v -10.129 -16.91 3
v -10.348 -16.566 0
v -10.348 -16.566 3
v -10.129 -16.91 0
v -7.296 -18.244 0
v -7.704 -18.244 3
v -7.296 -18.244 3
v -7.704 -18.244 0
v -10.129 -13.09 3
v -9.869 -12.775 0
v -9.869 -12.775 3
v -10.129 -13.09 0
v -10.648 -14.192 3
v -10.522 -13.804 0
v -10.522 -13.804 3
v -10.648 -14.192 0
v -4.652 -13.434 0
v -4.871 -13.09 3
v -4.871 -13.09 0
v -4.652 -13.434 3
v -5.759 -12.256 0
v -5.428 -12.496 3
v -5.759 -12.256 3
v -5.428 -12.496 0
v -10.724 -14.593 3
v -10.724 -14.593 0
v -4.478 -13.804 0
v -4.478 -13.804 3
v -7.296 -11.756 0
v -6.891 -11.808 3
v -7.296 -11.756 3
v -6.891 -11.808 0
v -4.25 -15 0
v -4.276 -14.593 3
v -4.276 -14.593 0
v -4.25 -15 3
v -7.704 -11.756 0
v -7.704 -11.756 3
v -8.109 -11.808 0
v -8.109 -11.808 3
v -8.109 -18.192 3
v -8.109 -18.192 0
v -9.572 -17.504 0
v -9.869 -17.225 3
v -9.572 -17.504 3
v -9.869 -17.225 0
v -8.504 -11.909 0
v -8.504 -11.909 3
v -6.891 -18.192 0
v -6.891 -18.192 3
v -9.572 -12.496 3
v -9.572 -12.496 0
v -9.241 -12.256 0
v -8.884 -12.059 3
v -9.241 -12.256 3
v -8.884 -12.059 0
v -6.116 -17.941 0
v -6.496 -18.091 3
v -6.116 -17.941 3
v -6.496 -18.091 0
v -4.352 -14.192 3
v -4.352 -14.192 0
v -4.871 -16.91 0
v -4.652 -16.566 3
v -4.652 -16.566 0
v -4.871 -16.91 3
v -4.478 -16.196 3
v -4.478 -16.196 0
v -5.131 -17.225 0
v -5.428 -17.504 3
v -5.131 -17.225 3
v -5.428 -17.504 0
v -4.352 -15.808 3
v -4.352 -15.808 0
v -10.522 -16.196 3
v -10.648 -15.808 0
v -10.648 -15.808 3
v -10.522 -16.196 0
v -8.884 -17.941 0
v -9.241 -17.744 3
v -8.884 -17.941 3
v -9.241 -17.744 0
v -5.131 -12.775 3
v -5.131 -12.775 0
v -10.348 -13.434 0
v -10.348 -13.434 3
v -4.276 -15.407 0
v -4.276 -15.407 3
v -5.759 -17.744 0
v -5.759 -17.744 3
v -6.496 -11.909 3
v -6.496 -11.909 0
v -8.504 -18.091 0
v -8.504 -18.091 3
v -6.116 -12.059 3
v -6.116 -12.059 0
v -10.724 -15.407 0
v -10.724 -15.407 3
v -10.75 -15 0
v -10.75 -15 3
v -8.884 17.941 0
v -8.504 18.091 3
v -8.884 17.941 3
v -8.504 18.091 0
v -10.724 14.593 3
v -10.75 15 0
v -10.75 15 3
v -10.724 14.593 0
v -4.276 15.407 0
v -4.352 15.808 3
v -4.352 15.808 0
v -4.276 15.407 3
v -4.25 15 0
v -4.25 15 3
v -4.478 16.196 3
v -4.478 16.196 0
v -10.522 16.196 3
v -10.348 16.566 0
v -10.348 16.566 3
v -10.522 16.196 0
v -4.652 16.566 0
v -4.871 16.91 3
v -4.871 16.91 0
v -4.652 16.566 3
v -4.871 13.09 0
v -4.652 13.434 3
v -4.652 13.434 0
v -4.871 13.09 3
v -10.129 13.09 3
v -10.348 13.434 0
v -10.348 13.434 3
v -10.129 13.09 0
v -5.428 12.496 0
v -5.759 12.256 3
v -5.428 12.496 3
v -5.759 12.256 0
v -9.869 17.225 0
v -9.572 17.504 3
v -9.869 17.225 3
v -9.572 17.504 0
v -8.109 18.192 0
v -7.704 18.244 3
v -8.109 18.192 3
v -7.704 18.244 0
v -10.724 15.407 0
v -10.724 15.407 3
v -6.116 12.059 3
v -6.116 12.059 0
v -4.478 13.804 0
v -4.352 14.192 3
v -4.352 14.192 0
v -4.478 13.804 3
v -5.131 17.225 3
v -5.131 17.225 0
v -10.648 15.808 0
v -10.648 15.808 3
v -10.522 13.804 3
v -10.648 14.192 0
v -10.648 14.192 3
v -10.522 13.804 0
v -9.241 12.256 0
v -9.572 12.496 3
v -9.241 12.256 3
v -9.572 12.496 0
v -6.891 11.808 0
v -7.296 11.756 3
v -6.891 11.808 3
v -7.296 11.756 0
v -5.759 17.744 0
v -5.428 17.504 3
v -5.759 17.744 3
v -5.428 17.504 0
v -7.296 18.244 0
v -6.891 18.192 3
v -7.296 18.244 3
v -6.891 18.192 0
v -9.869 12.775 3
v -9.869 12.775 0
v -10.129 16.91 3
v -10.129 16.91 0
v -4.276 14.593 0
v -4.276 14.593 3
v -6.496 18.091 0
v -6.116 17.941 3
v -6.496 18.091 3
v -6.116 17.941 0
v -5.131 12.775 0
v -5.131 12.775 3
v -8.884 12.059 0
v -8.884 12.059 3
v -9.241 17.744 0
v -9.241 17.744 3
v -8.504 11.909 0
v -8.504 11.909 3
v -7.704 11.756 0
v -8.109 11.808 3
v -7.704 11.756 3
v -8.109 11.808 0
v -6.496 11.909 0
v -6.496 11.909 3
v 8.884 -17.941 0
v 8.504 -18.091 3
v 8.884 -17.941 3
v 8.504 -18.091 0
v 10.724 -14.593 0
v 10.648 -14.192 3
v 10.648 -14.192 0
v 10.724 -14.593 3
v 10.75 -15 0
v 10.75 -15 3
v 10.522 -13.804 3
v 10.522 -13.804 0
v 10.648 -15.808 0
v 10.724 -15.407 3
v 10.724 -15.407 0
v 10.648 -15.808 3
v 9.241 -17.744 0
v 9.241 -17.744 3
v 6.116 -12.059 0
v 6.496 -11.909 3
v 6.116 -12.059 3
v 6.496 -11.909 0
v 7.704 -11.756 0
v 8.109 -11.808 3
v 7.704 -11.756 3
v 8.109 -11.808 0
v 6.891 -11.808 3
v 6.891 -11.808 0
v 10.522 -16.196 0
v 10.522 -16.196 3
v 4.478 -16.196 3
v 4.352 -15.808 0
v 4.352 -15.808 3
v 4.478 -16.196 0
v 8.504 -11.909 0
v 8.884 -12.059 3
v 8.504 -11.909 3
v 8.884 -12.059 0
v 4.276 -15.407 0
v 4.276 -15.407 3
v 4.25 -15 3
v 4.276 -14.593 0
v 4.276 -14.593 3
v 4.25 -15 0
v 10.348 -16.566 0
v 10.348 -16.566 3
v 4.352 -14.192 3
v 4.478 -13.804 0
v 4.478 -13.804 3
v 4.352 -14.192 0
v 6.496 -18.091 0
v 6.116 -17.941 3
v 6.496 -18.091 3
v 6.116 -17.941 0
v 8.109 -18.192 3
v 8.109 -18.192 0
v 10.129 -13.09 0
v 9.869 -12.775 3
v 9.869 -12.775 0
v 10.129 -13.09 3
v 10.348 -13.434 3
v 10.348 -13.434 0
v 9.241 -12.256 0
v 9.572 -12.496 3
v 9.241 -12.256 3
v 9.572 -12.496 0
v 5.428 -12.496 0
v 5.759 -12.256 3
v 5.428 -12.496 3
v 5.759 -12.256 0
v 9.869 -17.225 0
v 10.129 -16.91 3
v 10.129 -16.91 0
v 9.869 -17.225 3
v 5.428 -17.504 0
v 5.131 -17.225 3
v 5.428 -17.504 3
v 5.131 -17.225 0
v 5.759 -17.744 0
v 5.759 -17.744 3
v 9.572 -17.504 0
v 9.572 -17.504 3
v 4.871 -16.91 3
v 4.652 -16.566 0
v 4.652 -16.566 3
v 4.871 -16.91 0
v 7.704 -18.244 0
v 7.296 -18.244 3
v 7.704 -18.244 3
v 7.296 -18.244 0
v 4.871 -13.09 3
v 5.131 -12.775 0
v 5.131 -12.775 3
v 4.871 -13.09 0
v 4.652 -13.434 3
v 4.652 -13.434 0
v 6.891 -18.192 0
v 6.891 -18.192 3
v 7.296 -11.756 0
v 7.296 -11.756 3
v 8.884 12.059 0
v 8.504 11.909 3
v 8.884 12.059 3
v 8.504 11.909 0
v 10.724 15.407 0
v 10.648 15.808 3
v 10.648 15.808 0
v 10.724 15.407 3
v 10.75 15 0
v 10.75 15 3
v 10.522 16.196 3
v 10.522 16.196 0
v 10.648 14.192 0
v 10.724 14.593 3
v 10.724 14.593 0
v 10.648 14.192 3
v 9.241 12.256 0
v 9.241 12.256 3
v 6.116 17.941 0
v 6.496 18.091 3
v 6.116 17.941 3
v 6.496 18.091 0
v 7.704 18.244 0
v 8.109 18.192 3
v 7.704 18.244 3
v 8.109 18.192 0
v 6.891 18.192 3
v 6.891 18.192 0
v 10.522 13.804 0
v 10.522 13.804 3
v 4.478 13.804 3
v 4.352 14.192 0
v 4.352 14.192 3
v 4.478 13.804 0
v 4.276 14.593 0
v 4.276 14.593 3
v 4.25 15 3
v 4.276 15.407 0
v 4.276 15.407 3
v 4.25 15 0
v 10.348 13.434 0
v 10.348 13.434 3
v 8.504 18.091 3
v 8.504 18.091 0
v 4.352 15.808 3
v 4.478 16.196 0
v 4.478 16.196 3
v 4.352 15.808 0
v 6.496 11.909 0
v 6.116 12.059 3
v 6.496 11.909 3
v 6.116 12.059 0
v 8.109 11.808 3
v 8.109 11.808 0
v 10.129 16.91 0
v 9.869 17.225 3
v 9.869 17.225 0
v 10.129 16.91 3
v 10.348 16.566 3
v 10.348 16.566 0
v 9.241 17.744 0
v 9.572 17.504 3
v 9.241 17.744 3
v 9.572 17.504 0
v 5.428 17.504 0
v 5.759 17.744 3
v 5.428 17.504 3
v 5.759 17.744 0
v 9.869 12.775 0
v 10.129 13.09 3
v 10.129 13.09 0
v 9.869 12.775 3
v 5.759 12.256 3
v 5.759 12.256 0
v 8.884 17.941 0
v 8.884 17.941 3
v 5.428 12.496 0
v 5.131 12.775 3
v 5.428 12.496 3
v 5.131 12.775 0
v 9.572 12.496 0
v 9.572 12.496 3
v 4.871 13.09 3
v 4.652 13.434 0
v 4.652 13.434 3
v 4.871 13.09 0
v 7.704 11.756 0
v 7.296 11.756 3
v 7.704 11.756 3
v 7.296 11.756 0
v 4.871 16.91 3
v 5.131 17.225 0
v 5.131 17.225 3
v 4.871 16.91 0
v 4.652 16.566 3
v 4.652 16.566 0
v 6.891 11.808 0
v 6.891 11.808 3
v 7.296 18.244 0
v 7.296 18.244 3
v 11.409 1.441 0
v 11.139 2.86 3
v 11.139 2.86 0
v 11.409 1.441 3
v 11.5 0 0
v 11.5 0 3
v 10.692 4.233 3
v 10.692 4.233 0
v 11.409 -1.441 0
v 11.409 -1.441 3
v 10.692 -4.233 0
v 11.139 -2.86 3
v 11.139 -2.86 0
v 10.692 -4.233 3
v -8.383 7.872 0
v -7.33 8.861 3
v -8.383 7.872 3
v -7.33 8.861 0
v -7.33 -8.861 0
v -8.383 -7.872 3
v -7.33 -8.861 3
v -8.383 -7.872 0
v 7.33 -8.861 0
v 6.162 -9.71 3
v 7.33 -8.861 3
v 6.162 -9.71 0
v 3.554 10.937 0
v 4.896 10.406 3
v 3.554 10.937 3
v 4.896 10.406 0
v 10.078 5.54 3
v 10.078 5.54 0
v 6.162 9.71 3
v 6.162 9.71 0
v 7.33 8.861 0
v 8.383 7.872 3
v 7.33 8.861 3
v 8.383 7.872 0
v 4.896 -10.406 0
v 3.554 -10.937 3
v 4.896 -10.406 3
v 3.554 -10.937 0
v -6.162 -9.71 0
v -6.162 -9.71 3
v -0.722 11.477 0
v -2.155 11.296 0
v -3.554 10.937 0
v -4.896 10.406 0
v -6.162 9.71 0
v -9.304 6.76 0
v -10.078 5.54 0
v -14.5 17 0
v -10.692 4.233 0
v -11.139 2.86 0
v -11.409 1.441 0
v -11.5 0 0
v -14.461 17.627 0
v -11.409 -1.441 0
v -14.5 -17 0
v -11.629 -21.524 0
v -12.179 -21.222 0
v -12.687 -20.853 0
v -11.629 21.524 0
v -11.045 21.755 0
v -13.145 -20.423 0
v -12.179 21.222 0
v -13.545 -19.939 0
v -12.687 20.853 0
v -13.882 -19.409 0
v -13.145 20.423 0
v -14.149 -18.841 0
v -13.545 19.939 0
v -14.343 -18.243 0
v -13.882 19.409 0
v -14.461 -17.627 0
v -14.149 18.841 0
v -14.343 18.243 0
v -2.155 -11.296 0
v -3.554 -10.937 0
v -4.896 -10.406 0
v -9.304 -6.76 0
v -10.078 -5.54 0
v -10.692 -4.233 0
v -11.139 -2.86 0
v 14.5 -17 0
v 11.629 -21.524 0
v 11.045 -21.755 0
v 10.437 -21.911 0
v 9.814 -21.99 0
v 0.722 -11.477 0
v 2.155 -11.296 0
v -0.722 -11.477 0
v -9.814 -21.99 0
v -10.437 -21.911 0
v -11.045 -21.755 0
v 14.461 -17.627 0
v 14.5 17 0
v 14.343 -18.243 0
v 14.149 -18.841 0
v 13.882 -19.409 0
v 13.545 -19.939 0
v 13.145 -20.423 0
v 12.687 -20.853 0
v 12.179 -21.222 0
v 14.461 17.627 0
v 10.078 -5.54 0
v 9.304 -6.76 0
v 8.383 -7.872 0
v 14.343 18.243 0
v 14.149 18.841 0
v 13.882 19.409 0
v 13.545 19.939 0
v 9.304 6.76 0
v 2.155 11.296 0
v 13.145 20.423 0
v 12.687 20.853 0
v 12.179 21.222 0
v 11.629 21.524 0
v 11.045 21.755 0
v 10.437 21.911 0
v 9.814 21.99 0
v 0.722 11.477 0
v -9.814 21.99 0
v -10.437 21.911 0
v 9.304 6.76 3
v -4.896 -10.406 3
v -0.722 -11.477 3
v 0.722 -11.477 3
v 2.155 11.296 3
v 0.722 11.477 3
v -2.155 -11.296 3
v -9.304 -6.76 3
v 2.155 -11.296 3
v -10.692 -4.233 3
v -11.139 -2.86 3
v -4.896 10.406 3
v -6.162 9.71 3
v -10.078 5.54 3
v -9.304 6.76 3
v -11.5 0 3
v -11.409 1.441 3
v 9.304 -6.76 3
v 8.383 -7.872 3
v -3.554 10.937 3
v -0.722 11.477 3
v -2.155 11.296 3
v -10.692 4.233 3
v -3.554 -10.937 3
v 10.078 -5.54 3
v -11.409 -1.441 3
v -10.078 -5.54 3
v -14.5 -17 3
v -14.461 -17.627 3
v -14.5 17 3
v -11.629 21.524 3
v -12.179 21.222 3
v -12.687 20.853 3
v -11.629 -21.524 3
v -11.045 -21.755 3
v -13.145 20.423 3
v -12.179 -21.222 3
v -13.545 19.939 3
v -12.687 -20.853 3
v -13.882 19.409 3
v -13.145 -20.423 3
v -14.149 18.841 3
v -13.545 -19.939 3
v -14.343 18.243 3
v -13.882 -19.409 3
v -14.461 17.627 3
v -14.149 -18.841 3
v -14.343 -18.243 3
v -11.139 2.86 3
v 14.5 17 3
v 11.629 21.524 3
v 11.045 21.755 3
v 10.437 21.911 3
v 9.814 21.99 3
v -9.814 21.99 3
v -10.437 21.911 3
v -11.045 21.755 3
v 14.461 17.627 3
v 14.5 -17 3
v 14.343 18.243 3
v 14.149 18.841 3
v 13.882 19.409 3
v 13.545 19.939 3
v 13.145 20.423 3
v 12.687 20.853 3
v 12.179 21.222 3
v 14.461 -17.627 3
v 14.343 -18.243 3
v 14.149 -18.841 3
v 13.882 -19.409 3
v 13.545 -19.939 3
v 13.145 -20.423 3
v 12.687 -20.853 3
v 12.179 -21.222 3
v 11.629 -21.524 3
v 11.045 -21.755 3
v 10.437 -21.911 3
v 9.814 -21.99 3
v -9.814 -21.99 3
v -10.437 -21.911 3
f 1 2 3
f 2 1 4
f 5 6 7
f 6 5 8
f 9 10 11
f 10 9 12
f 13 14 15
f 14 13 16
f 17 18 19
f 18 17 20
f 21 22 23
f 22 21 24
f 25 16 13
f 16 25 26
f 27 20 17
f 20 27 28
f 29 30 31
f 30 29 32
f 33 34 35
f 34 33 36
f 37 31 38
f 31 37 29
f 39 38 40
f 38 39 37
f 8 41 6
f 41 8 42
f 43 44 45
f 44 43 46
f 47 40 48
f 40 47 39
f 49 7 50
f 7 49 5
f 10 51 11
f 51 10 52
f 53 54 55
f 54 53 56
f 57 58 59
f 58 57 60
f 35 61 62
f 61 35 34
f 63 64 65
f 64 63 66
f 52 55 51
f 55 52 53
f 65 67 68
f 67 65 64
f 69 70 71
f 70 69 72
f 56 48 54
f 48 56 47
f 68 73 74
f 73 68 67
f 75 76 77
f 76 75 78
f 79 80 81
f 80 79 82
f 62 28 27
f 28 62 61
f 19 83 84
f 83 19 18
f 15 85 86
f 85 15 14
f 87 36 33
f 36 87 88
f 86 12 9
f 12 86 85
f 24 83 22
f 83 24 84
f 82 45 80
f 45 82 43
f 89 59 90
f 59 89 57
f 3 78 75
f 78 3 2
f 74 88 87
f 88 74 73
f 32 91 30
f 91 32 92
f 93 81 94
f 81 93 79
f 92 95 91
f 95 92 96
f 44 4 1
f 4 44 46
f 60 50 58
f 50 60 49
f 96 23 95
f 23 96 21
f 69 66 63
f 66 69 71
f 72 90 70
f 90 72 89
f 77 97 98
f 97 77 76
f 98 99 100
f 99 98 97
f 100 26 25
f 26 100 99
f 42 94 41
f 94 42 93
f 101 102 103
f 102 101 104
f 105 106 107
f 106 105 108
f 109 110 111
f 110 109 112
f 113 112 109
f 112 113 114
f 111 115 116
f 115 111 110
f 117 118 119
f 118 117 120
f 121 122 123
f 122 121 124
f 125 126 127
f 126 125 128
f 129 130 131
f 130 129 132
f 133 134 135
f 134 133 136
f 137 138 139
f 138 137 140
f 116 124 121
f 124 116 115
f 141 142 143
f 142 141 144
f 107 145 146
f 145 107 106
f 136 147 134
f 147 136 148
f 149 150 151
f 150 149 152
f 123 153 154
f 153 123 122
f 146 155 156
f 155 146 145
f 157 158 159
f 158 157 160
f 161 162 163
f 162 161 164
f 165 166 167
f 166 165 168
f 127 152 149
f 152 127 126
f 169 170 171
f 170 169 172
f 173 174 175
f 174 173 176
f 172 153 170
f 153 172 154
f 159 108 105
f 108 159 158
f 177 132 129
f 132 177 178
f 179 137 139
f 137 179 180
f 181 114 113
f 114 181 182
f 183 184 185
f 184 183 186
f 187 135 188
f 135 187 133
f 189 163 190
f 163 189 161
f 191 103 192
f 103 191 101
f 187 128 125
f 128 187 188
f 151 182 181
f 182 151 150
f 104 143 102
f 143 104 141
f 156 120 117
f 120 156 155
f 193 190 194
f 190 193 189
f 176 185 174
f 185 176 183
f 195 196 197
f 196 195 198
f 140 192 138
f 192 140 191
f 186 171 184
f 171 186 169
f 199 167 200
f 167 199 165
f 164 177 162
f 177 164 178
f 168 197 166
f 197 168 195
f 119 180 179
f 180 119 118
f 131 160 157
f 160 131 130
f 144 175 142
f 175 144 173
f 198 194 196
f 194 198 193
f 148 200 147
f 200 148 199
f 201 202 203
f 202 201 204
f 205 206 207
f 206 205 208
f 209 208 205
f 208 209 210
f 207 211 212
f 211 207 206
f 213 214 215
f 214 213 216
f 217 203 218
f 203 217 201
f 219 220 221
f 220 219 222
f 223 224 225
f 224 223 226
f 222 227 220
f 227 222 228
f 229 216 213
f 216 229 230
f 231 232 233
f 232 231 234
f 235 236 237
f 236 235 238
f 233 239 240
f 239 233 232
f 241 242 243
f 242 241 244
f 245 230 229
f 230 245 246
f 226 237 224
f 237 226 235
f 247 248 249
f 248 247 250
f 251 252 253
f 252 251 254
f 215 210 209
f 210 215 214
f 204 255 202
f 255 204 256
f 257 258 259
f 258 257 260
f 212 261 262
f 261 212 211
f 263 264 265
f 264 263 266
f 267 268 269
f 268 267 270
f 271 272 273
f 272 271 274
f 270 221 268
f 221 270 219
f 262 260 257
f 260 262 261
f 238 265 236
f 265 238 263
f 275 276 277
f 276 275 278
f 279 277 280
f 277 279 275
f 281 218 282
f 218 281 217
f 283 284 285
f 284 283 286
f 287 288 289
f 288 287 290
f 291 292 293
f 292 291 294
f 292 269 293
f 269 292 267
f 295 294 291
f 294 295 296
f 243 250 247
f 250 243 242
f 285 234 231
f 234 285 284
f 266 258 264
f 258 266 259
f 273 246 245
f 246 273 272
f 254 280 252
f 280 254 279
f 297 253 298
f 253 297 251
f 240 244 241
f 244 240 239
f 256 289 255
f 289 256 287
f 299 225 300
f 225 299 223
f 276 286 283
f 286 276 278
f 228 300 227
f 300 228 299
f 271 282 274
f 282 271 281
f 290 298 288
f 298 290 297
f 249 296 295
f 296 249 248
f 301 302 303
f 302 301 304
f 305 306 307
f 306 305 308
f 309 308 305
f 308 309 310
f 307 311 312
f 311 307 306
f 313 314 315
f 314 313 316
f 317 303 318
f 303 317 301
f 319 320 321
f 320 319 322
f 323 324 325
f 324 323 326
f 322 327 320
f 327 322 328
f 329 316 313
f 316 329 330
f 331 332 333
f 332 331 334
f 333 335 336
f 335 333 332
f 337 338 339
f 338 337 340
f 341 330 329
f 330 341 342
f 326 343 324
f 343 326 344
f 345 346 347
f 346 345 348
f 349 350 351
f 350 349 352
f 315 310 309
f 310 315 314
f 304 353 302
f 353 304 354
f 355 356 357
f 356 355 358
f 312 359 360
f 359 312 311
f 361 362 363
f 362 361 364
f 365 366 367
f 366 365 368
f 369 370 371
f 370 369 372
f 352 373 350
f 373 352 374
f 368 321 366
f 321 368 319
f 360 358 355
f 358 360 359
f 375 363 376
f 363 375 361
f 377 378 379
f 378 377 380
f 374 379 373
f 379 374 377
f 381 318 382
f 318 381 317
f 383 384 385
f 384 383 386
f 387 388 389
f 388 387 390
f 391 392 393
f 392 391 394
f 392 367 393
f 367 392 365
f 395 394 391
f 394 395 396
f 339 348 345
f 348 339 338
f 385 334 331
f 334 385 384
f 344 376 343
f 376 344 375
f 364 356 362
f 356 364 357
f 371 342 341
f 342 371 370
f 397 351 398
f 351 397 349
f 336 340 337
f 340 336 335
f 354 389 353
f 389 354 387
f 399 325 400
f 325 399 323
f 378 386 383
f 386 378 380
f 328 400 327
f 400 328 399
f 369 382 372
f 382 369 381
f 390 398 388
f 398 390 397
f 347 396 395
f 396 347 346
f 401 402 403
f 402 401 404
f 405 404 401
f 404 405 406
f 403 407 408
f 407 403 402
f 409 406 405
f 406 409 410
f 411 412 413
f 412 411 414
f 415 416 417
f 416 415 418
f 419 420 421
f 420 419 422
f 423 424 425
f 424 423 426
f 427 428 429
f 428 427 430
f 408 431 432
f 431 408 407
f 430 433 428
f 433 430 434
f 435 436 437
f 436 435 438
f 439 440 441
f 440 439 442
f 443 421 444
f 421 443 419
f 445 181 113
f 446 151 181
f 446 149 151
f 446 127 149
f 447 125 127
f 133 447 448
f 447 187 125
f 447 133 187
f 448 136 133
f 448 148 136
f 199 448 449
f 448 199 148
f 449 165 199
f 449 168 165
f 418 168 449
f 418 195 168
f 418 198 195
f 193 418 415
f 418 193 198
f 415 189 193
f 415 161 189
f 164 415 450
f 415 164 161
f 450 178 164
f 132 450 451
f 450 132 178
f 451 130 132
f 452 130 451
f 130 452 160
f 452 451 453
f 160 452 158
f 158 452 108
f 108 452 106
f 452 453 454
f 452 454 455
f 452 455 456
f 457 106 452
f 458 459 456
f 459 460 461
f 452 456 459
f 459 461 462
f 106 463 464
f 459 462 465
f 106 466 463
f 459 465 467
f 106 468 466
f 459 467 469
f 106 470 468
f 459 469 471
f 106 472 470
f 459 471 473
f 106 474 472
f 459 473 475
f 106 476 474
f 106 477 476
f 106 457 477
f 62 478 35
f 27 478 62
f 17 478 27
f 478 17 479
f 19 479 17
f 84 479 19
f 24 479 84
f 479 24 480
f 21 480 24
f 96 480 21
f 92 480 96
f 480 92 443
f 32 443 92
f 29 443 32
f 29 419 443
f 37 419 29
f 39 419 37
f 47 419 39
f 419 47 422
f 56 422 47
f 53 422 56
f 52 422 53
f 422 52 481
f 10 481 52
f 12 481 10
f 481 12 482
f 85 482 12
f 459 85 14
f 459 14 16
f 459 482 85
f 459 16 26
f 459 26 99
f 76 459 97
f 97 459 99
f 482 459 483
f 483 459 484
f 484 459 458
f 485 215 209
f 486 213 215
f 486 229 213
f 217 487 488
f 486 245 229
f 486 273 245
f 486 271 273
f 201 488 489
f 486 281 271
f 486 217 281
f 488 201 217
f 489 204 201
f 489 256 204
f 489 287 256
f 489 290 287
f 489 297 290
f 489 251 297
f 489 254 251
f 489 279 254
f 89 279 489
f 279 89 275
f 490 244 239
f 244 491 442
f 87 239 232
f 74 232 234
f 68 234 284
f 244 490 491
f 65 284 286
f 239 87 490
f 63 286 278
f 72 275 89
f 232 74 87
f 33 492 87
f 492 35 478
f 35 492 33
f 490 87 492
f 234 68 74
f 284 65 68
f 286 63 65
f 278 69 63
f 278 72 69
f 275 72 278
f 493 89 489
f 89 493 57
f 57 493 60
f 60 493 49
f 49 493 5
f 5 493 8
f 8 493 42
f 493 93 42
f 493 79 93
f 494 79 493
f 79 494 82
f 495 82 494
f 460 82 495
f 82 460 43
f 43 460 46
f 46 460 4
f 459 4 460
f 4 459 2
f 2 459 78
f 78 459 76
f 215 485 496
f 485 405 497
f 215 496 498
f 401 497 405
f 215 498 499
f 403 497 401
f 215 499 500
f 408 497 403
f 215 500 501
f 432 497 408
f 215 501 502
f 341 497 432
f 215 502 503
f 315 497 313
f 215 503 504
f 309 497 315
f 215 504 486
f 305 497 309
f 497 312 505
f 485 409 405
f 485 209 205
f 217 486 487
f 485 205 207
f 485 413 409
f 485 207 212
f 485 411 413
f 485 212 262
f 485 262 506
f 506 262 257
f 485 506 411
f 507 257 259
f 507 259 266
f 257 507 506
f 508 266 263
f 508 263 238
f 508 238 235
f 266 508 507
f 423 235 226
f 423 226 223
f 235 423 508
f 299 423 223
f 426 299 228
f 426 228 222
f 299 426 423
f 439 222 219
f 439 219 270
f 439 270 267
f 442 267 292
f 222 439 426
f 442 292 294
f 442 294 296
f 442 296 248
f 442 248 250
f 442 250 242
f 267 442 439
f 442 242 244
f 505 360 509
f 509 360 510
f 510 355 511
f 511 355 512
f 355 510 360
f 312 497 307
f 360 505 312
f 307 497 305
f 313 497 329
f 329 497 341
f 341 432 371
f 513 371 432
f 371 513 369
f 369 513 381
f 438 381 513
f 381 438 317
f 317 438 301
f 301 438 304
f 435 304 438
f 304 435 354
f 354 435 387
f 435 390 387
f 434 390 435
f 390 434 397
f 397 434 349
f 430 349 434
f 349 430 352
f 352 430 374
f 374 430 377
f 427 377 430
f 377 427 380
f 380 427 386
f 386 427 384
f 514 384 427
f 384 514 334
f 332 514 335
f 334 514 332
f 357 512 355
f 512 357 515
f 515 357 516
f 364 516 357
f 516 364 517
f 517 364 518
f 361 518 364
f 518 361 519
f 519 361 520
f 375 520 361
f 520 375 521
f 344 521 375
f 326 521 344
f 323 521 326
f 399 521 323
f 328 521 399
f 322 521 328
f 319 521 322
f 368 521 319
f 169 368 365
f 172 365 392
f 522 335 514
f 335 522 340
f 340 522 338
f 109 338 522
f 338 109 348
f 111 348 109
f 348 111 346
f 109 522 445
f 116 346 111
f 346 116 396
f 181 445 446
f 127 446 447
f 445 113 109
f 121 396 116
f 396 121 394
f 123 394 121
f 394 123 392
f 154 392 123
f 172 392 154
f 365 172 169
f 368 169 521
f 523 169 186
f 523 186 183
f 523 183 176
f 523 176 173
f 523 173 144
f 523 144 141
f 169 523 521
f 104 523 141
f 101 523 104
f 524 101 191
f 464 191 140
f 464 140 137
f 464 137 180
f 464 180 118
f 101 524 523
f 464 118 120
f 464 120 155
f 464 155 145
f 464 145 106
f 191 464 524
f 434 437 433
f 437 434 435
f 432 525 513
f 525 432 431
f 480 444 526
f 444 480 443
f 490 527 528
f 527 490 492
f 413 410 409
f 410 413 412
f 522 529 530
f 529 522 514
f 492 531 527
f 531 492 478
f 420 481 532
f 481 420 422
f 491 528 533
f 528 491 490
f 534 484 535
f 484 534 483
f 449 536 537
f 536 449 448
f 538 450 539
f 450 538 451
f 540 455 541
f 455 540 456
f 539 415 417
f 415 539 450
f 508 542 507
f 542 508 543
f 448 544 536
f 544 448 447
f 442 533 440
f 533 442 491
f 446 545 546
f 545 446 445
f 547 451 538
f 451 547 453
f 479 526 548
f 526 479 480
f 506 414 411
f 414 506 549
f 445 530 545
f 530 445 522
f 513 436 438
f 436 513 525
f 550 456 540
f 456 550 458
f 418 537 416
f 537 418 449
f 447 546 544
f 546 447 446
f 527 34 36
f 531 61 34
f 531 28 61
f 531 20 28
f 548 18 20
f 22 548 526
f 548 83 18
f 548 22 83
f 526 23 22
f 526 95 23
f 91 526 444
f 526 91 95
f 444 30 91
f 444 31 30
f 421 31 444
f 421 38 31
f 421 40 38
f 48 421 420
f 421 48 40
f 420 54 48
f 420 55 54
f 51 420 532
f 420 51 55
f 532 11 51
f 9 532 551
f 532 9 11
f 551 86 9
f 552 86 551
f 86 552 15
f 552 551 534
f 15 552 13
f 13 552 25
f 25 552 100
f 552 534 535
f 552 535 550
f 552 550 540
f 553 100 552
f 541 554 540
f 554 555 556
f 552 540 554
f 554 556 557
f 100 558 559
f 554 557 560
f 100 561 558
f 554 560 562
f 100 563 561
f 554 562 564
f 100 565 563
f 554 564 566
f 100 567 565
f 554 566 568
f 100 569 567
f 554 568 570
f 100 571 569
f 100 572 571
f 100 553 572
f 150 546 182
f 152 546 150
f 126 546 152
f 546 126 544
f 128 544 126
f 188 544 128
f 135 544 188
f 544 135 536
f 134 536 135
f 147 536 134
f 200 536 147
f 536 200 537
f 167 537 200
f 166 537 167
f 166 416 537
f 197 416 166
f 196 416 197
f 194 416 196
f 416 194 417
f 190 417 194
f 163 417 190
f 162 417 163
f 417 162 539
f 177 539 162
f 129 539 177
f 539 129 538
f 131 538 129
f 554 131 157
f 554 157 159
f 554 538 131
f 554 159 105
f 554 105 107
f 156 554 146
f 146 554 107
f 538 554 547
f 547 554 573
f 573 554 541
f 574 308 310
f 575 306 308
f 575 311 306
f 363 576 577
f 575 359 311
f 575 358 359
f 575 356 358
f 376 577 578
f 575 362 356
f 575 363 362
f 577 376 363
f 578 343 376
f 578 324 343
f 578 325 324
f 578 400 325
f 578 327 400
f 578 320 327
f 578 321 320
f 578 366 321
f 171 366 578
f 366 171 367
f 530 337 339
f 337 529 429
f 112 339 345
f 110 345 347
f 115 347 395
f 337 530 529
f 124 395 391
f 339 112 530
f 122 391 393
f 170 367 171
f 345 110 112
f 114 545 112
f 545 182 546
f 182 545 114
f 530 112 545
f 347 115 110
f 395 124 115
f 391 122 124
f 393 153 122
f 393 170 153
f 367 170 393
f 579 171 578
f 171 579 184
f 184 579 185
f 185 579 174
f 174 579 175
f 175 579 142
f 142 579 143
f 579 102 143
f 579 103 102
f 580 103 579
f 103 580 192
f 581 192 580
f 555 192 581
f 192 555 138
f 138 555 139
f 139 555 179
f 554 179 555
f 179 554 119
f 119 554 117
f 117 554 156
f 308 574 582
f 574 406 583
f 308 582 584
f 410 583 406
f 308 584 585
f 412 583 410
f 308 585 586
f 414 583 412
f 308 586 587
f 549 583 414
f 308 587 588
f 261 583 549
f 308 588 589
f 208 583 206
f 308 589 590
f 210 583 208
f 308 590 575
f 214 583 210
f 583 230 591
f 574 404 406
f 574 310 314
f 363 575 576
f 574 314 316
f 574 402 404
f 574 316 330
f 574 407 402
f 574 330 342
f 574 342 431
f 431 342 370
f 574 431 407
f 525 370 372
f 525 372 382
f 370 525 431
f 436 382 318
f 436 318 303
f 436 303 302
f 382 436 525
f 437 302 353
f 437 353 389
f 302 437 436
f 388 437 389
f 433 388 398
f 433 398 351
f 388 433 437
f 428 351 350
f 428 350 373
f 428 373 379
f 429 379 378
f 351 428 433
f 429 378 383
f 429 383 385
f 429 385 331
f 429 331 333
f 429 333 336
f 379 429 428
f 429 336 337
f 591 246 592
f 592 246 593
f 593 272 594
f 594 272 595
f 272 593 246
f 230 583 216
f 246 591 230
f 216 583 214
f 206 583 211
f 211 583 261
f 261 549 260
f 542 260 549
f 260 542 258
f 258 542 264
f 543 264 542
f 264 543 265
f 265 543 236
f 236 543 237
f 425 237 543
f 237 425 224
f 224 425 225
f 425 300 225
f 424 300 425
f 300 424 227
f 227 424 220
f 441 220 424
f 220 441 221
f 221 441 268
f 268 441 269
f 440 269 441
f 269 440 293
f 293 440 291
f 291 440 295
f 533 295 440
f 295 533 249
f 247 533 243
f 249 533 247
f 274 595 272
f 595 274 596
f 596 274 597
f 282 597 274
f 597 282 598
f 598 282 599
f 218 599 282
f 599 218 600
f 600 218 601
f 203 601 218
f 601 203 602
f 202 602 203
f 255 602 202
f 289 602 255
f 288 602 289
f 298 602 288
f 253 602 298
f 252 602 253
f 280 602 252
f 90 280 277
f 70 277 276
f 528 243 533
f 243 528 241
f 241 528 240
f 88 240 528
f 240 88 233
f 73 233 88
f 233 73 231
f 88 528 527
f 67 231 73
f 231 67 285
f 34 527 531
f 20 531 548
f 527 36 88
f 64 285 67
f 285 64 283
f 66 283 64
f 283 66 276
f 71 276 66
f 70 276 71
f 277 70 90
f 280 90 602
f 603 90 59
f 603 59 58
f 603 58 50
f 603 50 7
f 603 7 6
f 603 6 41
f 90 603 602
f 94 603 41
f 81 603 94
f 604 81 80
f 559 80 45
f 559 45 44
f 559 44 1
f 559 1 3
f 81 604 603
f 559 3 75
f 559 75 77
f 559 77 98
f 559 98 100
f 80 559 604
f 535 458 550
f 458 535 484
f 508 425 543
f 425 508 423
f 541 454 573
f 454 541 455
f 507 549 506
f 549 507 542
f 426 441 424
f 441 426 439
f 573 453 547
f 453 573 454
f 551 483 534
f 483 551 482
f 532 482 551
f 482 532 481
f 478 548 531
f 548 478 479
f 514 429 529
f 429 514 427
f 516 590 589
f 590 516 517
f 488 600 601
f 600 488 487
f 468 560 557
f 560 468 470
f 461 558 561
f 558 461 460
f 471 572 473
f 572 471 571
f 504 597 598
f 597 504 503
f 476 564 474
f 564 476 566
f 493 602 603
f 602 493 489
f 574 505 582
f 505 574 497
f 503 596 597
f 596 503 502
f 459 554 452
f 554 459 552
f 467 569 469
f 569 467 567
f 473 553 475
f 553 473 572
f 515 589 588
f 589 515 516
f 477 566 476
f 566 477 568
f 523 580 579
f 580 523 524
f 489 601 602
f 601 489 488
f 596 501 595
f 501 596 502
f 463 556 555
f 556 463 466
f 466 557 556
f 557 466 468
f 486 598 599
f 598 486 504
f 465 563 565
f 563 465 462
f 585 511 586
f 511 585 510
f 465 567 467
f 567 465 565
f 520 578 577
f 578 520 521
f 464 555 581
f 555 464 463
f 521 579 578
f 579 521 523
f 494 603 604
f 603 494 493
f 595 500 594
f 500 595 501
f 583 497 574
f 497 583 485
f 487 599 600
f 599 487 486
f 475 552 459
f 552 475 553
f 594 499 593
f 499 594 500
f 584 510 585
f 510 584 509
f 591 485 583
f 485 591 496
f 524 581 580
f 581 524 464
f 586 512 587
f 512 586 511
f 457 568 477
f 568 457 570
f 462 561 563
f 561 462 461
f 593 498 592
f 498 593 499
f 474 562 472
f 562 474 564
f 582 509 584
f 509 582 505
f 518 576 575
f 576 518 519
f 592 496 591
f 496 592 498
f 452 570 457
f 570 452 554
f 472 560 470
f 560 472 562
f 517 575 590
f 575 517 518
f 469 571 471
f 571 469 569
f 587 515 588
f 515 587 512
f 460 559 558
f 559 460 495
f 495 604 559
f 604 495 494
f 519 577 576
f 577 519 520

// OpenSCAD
$fn = 50;


difference() {
	union() {
		hull() {
			translate(v = [-9.5000000000, 17.0000000000, 0]) {
				cylinder(h = 3, r = 5);
			}
			translate(v = [9.5000000000, 17.0000000000, 0]) {
				cylinder(h = 3, r = 5);
			}
			translate(v = [-9.5000000000, -17.0000000000, 0]) {
				cylinder(h = 3, r = 5);
			}
			translate(v = [9.5000000000, -17.0000000000, 0]) {
				cylinder(h = 3, r = 5);
			}
		}
	}
	union() {
		#translate(v = [-7.5000000000, -15.0000000000, -100.0000000000]) {
			cylinder(h = 200, r = 3.2500000000);
		}
		#translate(v = [-7.5000000000, 15.0000000000, -100.0000000000]) {
			cylinder(h = 200, r = 3.2500000000);
		}
		#translate(v = [7.5000000000, -15.0000000000, -100.0000000000]) {
			cylinder(h = 200, r = 3.2500000000);
		}
		#translate(v = [7.5000000000, 15.0000000000, -100.0000000000]) {
			cylinder(h = 200, r = 3.2500000000);
		}
		#cylinder(h = 3, r = 11.5000000000);
	}
}
